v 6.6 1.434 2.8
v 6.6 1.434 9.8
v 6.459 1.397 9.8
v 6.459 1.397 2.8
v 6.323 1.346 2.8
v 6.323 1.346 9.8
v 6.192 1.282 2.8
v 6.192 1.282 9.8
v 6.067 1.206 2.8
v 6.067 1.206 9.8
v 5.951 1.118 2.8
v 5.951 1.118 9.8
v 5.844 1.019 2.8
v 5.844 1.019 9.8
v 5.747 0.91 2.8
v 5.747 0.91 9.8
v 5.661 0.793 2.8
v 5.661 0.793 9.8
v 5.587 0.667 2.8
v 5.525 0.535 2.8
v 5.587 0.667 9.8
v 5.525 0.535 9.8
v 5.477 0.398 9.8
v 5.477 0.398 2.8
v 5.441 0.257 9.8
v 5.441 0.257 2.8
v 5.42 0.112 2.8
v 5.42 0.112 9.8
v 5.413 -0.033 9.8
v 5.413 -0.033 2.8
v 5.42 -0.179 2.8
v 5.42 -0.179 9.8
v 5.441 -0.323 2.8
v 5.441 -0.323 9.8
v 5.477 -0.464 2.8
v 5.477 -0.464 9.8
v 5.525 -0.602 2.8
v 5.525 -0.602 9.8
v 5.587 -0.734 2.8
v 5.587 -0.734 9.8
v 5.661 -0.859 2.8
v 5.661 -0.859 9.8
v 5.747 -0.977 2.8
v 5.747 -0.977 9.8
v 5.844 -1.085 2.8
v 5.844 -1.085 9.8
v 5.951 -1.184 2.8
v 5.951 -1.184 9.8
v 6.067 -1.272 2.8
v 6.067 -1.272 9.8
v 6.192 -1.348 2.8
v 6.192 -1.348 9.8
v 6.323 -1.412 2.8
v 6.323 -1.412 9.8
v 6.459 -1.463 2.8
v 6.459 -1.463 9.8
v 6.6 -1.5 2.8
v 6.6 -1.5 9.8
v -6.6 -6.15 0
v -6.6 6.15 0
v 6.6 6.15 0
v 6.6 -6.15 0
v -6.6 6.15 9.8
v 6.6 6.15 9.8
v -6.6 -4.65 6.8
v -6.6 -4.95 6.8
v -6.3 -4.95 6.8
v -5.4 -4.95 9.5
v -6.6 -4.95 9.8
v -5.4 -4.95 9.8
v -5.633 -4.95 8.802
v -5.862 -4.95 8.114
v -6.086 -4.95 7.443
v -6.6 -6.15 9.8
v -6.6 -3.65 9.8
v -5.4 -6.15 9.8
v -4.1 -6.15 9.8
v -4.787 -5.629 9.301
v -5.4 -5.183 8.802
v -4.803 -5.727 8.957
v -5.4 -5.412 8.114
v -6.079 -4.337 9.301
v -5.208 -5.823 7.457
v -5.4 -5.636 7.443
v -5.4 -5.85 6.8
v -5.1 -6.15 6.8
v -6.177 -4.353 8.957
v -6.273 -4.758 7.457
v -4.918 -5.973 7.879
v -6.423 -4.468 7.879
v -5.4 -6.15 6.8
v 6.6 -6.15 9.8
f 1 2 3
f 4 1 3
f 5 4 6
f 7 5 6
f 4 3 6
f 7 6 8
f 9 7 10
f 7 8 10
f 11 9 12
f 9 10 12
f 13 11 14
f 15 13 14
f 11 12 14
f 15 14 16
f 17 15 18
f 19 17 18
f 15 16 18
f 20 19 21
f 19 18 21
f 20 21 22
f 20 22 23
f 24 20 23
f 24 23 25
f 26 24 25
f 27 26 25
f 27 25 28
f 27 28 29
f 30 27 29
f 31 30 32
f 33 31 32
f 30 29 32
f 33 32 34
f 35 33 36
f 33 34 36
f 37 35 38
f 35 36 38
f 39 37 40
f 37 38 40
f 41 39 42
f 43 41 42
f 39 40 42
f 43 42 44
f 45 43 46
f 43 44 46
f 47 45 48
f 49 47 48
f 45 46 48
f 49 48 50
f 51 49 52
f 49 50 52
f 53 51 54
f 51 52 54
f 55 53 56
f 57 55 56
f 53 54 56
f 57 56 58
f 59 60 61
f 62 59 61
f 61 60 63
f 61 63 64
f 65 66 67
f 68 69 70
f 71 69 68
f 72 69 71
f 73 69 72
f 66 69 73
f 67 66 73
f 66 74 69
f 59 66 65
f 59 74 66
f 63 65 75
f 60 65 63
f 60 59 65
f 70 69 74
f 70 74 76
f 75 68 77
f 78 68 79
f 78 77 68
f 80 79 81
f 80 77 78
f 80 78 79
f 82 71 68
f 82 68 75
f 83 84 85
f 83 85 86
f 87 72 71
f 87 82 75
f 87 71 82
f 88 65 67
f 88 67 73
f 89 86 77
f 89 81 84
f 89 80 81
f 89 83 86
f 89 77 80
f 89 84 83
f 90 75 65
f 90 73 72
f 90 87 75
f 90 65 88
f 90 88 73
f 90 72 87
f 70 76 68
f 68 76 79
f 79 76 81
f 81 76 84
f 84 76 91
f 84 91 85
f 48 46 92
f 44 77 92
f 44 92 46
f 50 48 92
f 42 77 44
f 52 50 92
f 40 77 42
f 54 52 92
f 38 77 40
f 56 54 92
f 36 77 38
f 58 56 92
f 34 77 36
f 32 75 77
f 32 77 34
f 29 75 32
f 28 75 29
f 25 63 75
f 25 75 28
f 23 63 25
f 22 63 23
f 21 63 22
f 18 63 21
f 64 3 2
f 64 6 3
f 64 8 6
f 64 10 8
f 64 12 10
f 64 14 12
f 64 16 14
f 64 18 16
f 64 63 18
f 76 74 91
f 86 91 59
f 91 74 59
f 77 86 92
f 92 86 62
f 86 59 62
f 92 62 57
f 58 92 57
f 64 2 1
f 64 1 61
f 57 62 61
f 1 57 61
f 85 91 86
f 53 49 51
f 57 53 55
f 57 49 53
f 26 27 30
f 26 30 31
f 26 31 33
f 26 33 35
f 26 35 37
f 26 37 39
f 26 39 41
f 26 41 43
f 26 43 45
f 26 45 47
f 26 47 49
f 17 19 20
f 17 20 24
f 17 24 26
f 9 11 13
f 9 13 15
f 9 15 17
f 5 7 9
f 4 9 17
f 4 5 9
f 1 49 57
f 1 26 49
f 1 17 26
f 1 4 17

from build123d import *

# Parameters (mm, degrees)
F0_W     = 13.2
F0_H     = 12.3
F1_DEPTH = 9.8
F6_W     = 1.2
F6_H     = 1.2
F7_DEPTH = 3
F9_DEPTH = 7


with BuildPart() as f1:
    # F0 (on Top) → F1 (new body)
    with BuildSketch(Plane.XY):
        Rectangle(F0_W, F0_H)
    extrude(amount=F1_DEPTH)

    # F3 (on face) → F5 section 0
    with BuildSketch(Plane.XY.offset(9.8)):
        Polygon((-6.6, -3.65), (-6.6, -6.15), (-4.1, -6.15), align=None)
    # F4 (on offset) → F5 section 1
    with BuildSketch(Plane.XY.offset(6.8)):
        Polygon((-6.6, -6.15), (-5.1, -6.15), (-6.6, -4.65), align=None)
    loft(mode=Mode.SUBTRACT)

    # F6 (on face) → F7 (join)
    with BuildSketch(Plane.XY.offset(6.8)):
        with Locations((-6, -5.55)):
            Rectangle(F6_W, F6_H)
    extrude(amount=F7_DEPTH)

    # F8 (on face) → F9 (cut)
    with BuildSketch(Plane.XY.offset(9.8)):
        with BuildLine():
            Line((6.6, -1.5), (6.6, 1.433861))
            ThreePointArc((6.6, 1.433861), (5.413233, -0.03307), (6.6, -1.5))
        make_face()
    extrude(amount=-F9_DEPTH, mode=Mode.SUBTRACT)


solid = f1.part
